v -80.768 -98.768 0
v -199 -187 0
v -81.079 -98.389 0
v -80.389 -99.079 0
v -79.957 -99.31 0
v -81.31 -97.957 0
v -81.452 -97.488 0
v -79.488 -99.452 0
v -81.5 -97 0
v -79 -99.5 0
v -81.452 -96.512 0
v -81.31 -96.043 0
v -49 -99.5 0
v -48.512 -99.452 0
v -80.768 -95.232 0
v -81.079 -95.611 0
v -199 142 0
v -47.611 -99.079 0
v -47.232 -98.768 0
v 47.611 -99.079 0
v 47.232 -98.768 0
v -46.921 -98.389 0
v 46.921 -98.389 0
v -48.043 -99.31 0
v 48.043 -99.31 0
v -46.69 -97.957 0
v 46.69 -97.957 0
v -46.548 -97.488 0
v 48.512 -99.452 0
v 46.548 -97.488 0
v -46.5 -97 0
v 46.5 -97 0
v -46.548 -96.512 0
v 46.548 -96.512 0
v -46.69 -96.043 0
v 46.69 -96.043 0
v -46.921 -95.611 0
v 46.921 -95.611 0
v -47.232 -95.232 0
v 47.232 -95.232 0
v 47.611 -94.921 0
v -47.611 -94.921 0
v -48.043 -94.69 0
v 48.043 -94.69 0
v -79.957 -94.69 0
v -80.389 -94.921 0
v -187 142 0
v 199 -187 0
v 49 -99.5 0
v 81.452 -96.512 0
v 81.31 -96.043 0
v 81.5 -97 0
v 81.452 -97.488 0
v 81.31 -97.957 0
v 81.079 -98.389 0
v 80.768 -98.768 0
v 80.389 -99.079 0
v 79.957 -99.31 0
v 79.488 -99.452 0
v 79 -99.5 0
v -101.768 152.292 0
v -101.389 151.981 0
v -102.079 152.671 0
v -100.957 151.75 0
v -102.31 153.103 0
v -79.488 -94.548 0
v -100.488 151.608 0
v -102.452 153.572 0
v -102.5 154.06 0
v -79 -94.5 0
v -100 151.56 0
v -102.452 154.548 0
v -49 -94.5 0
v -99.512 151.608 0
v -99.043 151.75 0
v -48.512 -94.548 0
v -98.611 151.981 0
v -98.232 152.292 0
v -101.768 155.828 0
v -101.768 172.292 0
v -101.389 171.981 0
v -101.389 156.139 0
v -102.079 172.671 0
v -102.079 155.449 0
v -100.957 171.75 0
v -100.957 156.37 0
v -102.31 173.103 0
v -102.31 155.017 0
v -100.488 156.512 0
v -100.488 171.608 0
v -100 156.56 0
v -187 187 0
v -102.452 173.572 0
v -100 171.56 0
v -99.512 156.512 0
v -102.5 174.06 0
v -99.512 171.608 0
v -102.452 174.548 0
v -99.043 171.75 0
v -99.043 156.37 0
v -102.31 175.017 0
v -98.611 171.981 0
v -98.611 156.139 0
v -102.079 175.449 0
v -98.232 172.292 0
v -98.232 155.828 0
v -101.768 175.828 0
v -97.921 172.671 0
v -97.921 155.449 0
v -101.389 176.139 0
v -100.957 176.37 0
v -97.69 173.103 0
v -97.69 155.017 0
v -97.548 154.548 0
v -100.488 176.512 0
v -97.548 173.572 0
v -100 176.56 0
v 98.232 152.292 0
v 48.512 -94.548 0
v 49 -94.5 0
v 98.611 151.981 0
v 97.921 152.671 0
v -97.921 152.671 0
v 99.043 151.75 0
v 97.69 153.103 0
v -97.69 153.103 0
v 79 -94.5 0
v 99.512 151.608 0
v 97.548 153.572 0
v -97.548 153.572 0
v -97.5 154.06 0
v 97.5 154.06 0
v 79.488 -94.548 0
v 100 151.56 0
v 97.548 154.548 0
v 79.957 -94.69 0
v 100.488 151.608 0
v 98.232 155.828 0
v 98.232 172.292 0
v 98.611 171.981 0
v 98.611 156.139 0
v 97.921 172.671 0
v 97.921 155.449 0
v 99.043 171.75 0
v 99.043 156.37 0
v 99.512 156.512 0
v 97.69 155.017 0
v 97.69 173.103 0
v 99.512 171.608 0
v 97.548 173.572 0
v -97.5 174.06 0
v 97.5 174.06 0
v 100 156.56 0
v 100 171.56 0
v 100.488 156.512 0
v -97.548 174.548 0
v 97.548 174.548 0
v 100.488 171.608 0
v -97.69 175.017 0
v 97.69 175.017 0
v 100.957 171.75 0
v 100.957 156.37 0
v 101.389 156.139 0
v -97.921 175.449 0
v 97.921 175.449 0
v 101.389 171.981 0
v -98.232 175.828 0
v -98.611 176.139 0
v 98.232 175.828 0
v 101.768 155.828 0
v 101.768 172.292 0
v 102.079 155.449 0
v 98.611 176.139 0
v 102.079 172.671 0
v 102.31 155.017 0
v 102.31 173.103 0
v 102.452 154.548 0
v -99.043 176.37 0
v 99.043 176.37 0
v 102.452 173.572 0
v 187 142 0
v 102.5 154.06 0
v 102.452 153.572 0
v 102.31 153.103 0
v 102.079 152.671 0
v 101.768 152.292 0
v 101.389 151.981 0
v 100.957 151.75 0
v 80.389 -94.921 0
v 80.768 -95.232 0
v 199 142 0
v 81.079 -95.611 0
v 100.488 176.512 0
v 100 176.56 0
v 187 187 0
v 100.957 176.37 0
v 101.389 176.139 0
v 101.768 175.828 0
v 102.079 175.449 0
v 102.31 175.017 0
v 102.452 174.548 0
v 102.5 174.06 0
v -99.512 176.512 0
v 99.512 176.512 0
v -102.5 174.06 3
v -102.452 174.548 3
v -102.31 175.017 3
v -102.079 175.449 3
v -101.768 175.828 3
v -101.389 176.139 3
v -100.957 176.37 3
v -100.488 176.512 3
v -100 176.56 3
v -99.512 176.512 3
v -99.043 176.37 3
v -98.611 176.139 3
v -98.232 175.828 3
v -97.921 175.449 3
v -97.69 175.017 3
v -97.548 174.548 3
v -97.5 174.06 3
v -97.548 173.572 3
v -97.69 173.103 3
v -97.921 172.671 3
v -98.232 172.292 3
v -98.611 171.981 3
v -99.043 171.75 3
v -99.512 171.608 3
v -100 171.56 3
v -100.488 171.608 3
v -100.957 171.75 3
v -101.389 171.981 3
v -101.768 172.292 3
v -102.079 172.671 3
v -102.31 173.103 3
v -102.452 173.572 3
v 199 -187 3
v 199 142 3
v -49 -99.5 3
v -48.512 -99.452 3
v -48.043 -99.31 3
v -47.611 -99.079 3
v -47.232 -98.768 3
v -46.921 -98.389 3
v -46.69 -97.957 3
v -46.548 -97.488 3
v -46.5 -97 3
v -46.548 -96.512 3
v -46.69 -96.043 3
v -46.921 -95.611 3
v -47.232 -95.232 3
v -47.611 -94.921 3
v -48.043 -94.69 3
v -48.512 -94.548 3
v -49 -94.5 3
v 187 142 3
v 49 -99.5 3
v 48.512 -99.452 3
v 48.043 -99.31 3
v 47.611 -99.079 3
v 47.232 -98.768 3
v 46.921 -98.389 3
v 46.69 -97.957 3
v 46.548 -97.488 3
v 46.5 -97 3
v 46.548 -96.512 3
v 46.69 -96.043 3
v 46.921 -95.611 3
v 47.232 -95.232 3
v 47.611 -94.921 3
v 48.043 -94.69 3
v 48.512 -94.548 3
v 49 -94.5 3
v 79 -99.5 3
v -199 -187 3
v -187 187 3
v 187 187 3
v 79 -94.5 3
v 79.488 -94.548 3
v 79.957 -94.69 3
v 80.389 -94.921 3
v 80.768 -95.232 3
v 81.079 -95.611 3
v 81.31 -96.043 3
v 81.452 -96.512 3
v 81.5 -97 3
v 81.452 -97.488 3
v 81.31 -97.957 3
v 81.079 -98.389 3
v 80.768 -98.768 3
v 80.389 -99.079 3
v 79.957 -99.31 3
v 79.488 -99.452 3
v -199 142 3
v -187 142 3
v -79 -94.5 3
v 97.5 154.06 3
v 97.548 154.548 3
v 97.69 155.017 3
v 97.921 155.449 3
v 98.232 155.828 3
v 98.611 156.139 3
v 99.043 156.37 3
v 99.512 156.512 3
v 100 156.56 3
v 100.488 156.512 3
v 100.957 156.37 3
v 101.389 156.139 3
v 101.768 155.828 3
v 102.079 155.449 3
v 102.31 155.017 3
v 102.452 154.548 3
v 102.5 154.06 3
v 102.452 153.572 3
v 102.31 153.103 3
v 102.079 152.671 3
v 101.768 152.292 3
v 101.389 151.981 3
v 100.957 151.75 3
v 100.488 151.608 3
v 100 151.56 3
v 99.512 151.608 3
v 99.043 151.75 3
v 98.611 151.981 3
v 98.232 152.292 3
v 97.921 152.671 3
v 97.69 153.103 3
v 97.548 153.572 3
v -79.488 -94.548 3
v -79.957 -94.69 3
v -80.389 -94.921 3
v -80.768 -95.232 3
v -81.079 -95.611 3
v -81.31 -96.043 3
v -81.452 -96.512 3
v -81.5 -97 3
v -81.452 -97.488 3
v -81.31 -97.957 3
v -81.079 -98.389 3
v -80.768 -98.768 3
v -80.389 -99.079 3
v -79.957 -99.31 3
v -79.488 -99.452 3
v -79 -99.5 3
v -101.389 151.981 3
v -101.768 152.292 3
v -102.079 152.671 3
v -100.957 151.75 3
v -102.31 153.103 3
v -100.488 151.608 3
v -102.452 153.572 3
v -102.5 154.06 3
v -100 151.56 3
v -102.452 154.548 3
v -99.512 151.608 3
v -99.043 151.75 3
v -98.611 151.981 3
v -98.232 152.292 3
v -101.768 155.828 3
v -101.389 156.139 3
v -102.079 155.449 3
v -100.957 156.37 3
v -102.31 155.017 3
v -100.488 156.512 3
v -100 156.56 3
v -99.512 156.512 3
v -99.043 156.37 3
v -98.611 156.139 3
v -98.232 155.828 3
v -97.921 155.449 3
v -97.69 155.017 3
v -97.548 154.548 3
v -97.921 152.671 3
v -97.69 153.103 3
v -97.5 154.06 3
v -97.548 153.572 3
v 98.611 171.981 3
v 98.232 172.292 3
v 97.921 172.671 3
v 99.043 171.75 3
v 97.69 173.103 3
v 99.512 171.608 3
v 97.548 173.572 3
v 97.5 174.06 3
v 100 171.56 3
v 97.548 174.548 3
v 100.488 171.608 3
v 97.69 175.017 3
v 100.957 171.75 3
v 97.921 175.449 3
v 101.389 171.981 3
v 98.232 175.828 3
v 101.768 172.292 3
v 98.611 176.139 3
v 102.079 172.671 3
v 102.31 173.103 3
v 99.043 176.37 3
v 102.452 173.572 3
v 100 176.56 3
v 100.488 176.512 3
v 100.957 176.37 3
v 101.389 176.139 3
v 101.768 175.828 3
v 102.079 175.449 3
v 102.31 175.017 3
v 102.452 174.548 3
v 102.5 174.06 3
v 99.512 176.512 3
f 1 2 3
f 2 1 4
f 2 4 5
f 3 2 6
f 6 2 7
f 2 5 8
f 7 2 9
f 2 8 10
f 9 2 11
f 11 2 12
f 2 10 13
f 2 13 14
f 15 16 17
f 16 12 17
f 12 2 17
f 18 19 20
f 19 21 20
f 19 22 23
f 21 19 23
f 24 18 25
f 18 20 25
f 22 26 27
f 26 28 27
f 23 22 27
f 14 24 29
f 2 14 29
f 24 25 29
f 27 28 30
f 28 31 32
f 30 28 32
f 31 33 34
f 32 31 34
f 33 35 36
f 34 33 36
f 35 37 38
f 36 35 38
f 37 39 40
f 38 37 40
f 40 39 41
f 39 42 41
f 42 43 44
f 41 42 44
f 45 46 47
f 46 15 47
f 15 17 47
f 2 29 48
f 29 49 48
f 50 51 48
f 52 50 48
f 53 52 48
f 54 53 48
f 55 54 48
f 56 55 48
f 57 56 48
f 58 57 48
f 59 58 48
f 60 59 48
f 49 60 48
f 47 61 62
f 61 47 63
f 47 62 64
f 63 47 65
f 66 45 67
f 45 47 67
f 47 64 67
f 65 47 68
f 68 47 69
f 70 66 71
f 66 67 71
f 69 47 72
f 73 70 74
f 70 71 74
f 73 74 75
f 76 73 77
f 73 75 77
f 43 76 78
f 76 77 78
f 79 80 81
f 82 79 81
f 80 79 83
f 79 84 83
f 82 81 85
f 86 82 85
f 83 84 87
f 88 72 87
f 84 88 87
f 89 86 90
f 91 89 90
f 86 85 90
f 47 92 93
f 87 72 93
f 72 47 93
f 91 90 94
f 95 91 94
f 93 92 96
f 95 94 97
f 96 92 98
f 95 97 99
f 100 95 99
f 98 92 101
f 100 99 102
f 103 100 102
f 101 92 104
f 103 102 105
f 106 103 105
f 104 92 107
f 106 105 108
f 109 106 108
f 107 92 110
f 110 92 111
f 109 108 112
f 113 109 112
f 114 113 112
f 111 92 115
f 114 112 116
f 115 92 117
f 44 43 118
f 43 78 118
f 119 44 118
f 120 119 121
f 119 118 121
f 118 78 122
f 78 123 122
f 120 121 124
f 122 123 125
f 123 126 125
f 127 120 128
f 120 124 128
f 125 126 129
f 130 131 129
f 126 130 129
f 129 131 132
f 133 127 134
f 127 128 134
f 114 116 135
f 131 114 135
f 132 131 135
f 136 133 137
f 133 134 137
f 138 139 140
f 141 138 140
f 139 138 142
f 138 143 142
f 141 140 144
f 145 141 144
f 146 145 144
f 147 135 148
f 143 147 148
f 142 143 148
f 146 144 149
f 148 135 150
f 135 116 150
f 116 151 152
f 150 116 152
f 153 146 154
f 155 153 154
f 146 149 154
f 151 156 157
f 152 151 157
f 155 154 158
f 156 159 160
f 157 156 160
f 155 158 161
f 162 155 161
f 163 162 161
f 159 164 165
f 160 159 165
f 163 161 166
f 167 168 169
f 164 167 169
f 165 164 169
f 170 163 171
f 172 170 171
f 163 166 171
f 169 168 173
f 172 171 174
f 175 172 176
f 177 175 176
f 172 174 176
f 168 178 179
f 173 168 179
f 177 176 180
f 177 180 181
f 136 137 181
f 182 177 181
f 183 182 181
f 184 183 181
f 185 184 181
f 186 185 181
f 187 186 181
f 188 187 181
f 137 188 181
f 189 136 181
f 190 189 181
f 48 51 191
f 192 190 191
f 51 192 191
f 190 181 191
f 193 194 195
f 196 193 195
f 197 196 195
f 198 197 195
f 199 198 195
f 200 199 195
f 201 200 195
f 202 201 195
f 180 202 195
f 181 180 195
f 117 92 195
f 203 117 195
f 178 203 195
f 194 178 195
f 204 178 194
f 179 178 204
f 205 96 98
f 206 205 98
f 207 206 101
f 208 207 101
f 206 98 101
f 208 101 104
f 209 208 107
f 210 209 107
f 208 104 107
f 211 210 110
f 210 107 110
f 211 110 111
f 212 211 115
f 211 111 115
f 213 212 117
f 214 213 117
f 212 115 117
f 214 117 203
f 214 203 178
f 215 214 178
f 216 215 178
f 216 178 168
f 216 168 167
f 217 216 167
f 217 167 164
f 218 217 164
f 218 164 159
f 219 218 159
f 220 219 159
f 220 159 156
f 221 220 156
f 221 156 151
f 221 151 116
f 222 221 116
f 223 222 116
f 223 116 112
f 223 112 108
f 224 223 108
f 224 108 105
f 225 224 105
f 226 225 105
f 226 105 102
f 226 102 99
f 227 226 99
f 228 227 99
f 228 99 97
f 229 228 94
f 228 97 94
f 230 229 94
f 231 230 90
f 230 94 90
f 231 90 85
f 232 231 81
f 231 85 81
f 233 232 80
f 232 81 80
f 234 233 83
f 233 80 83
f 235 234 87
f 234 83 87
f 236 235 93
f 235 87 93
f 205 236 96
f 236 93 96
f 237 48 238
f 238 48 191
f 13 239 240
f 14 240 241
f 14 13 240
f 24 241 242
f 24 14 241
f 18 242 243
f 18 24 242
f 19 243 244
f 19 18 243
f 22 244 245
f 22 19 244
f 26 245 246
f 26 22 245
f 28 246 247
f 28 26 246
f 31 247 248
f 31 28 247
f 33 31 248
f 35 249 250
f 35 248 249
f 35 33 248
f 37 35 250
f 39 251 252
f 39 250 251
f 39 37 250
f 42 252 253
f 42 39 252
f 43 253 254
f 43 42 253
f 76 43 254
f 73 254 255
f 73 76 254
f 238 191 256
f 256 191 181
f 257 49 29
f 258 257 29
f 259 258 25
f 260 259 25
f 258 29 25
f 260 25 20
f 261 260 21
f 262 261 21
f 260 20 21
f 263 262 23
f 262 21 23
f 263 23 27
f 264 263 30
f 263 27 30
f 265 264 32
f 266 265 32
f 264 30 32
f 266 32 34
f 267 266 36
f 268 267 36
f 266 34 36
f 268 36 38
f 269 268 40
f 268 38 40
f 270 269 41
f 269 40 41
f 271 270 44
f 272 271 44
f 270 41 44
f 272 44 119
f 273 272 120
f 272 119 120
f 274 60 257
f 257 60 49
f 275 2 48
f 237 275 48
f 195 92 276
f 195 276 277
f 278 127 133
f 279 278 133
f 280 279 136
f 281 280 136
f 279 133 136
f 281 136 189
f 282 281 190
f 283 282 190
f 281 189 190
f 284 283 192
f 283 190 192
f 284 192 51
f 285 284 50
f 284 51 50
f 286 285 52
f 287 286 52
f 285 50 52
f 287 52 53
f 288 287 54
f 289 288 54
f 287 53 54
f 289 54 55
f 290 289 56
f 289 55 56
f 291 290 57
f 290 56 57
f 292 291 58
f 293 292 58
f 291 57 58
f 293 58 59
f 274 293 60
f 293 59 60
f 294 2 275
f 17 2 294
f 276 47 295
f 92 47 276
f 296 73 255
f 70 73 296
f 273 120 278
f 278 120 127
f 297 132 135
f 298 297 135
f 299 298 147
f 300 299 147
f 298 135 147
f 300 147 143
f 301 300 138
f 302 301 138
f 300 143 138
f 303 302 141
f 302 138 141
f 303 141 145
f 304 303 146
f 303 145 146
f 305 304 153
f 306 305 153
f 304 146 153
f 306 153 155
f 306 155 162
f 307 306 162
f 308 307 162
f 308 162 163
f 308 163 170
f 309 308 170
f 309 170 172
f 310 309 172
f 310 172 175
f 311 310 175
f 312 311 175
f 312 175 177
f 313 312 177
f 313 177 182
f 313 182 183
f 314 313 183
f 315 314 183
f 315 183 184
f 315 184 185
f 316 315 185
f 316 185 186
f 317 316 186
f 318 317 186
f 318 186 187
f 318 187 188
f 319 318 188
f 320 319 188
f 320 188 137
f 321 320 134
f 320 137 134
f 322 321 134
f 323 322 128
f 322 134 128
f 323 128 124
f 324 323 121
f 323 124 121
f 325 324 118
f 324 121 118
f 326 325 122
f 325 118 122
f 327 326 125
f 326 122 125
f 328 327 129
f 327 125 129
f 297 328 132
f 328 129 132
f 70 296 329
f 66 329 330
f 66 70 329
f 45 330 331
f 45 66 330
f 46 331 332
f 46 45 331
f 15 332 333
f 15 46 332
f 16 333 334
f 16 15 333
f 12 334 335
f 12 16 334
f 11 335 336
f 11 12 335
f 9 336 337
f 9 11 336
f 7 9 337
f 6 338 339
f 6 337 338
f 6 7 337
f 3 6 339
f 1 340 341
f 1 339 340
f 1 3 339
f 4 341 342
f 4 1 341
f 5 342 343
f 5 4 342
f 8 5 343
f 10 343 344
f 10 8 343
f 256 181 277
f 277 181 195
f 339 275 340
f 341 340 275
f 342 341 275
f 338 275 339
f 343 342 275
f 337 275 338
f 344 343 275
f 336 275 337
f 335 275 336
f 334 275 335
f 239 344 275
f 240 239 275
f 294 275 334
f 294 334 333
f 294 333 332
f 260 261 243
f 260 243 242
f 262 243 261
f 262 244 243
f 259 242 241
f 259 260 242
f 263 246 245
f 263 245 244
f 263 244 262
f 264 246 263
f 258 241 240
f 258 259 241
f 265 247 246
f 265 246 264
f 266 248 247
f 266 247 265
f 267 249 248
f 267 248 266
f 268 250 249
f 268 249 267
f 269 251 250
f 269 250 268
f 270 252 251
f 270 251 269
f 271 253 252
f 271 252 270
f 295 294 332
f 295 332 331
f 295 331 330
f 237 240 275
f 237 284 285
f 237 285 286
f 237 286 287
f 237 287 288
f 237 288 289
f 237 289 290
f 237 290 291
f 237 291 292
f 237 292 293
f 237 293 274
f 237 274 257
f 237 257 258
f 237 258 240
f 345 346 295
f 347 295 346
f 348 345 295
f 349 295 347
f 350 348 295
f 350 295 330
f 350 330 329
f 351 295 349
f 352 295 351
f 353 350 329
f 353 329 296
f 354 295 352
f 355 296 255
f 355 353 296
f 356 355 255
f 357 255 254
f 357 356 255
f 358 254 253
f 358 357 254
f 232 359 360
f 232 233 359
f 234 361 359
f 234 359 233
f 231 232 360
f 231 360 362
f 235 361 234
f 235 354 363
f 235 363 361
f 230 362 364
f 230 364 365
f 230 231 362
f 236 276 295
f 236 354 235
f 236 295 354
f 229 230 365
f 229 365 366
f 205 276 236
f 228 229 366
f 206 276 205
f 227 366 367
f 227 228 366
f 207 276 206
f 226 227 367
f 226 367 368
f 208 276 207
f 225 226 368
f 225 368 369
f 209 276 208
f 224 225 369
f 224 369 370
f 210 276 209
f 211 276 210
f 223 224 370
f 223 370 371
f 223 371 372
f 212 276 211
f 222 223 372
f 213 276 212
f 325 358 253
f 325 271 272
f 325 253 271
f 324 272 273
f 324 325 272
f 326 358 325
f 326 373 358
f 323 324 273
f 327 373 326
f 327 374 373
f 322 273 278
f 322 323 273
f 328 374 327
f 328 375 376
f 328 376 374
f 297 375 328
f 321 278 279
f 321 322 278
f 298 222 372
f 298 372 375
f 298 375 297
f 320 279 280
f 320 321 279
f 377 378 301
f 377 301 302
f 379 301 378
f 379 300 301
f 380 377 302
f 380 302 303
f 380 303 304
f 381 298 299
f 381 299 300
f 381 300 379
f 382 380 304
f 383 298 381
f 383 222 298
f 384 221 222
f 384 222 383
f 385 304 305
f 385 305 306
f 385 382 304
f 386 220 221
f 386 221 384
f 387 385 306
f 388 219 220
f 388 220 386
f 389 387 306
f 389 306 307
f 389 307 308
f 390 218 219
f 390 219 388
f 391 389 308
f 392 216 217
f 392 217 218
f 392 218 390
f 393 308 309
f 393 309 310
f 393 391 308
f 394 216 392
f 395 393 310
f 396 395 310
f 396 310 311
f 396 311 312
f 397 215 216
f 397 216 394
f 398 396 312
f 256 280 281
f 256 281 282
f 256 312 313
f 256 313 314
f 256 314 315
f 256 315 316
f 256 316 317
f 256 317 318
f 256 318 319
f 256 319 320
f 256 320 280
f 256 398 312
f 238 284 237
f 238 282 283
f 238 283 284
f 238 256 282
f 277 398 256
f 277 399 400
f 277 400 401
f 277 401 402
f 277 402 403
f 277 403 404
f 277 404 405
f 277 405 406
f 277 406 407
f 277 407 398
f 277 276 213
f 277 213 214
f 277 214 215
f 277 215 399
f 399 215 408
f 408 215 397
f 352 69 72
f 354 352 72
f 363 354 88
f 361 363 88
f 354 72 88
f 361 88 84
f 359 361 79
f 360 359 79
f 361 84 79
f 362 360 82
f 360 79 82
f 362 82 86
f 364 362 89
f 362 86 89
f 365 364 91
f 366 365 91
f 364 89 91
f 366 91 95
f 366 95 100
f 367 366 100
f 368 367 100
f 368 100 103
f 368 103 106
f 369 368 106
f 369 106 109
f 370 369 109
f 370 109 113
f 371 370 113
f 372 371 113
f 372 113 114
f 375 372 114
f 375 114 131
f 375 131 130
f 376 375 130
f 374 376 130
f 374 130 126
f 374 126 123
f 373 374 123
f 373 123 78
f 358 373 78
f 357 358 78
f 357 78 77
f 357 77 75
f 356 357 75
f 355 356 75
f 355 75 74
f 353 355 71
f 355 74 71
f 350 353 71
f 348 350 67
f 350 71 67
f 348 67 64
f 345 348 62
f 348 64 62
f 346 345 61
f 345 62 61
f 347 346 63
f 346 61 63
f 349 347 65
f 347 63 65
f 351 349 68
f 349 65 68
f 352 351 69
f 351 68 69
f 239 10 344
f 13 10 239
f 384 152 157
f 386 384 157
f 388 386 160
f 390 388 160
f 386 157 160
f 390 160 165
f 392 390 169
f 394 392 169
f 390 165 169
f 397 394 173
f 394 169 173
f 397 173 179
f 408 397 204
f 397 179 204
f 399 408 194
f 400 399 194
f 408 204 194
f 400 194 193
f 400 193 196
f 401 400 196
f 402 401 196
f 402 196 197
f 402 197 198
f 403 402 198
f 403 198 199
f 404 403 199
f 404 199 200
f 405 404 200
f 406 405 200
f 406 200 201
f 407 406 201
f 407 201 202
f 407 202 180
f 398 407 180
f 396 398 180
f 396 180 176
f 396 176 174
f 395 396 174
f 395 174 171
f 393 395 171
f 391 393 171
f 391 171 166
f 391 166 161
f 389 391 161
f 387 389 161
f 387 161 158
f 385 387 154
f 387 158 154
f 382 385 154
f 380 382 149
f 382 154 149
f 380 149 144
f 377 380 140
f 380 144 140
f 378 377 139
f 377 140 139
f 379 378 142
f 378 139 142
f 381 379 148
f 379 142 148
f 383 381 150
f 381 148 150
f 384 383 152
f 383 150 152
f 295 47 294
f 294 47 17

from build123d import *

# Parameters (mm, degrees)
SKETCH1_W           = 398
SKETCH1_H           = 374
BOSS_EXTRUDE1_DEPTH = 3
CUT_EXTRUDE1_REACH  = 275.092
SKETCH2_R           = 2.5
SKETCH2_W           = 12
SKETCH2_H           = 45
CUT_EXTRUDE2_REACH  = 275.092
SKETCH3_R           = 2.5
CUT_EXTRUDE3_DEPTH  = 274.091559738


with BuildPart() as part:
    # Sketch1 → Boss-Extrude1 (new body)
    with BuildSketch(Plane.XY):
        Rectangle(SKETCH1_W, SKETCH1_H)
    extrude(amount=BOSS_EXTRUDE1_DEPTH)

    # Sketch2 → Cut-Extrude1 (cut, up to next)
    with BuildSketch(Plane(origin=(0, 0, 0), x_dir=(-1, 0, 0), z_dir=(0, 0, -1)), mode=Mode.PRIVATE) as cut_extrude1_sk1:
        with Locations((-100, 174.06)):
            Circle(SKETCH2_R)
    cut_extrude1_tool1 = extrude(cut_extrude1_sk1.sketch, amount=-CUT_EXTRUDE1_REACH, mode=Mode.PRIVATE) & part.part
    # Sketch2 → Cut-Extrude1 (cut, up to next)
    with BuildSketch(Plane(origin=(0, 0, 0), x_dir=(-1, 0, 0), z_dir=(0, 0, -1)), mode=Mode.PRIVATE) as cut_extrude1_sk2:
        with Locations((-100, 154.06)):
            Circle(SKETCH2_R)
    cut_extrude1_tool2 = extrude(cut_extrude1_sk2.sketch, amount=-CUT_EXTRUDE1_REACH, mode=Mode.PRIVATE) & part.part
    # Sketch2 → Cut-Extrude1 (cut, up to next)
    with BuildSketch(Plane(origin=(0, 0, 0), x_dir=(-1, 0, 0), z_dir=(0, 0, -1)), mode=Mode.PRIVATE) as cut_extrude1_sk3:
        with Locations((100, 154.06)):
            Circle(SKETCH2_R)
    cut_extrude1_tool3 = extrude(cut_extrude1_sk3.sketch, amount=-CUT_EXTRUDE1_REACH, mode=Mode.PRIVATE) & part.part
    # Sketch2 → Cut-Extrude1 (cut, up to next)
    with BuildSketch(Plane(origin=(0, 0, 0), x_dir=(-1, 0, 0), z_dir=(0, 0, -1)), mode=Mode.PRIVATE) as cut_extrude1_sk4:
        with Locations((100, 174.06)):
            Circle(SKETCH2_R)
    cut_extrude1_tool4 = extrude(cut_extrude1_sk4.sketch, amount=-CUT_EXTRUDE1_REACH, mode=Mode.PRIVATE) & part.part
    # Sketch2 → Cut-Extrude1 (cut, up to next)
    with BuildSketch(Plane(origin=(0, 0, 0), x_dir=(-1, 0, 0), z_dir=(0, 0, -1)), mode=Mode.PRIVATE) as cut_extrude1_sk5:
        with Locations((-193, 164.5)):
            Rectangle(SKETCH2_W, SKETCH2_H)
    cut_extrude1_tool5 = extrude(cut_extrude1_sk5.sketch, amount=-CUT_EXTRUDE1_REACH, mode=Mode.PRIVATE) & part.part
    # Sketch2 → Cut-Extrude1 (cut, up to next)
    with BuildSketch(Plane(origin=(0, 0, 0), x_dir=(-1, 0, 0), z_dir=(0, 0, -1)), mode=Mode.PRIVATE) as cut_extrude1_sk6:
        with Locations((193, 164.5)):
            Rectangle(SKETCH2_W, SKETCH2_H)
    cut_extrude1_tool6 = extrude(cut_extrude1_sk6.sketch, amount=-CUT_EXTRUDE1_REACH, mode=Mode.PRIVATE) & part.part
    add(cut_extrude1_tool1.solids().sort_by_distance((100, 174.06, 0))[0], mode=Mode.SUBTRACT)
    add(cut_extrude1_tool2.solids().sort_by_distance((100, 154.06, 0))[0], mode=Mode.SUBTRACT)
    add(cut_extrude1_tool3.solids().sort_by_distance((-100, 154.06, 0))[0], mode=Mode.SUBTRACT)
    add(cut_extrude1_tool4.solids().sort_by_distance((-100, 174.06, 0))[0], mode=Mode.SUBTRACT)
    add(cut_extrude1_tool5.solids().sort_by_distance((193, 164.5, 0))[0], mode=Mode.SUBTRACT)
    add(cut_extrude1_tool6.solids().sort_by_distance((-193, 164.5, 0))[0], mode=Mode.SUBTRACT)

    # Sketch3 → Cut-Extrude2 (cut, up to next)
    with BuildSketch(Plane(origin=(0, 0, 0), x_dir=(-1, 0, 0), z_dir=(0, 0, -1)), mode=Mode.PRIVATE) as cut_extrude2_sk1:
        with Locations((64, -97)):
            Circle(SKETCH3_R)
    cut_extrude2_tool1 = extrude(cut_extrude2_sk1.sketch, amount=-CUT_EXTRUDE2_REACH, mode=Mode.PRIVATE) & part.part
    # Sketch3 → Cut-Extrude2 (cut, up to next)
    with BuildSketch(Plane(origin=(0, 0, 0), x_dir=(-1, 0, 0), z_dir=(0, 0, -1)), mode=Mode.PRIVATE) as cut_extrude2_sk2:
        with Locations((-64, -97)):
            Circle(SKETCH3_R)
    cut_extrude2_tool2 = extrude(cut_extrude2_sk2.sketch, amount=-CUT_EXTRUDE2_REACH, mode=Mode.PRIVATE) & part.part
    add(cut_extrude2_tool1.solids().sort_by_distance((-64, -97, 0))[0], mode=Mode.SUBTRACT)
    add(cut_extrude2_tool2.solids().sort_by_distance((64, -97, 0))[0], mode=Mode.SUBTRACT)

    # Sketch4 → Cut-Extrude3 (cut, through all)
    with BuildSketch(Plane(origin=(0, 0, 0), x_dir=(-1, 0, 0), z_dir=(0, 0, -1))):
        with BuildLine():
            Line((49, -94.5), (79, -94.5))
            ThreePointArc((79, -94.5), (81.5, -97), (79, -99.5))
            Line((79, -99.5), (49, -99.5))
            ThreePointArc((49, -99.5), (46.5, -97), (49, -94.5))
        make_face()
        with BuildLine():
            Line((-49, -94.5), (-79, -94.5))
            ThreePointArc((-79, -94.5), (-81.5, -97), (-79, -99.5))
            Line((-79, -99.5), (-49, -99.5))
            ThreePointArc((-49, -99.5), (-46.5, -97), (-49, -94.5))
        make_face()
    extrude(amount=-CUT_EXTRUDE3_DEPTH, mode=Mode.SUBTRACT)


solid = part.part
